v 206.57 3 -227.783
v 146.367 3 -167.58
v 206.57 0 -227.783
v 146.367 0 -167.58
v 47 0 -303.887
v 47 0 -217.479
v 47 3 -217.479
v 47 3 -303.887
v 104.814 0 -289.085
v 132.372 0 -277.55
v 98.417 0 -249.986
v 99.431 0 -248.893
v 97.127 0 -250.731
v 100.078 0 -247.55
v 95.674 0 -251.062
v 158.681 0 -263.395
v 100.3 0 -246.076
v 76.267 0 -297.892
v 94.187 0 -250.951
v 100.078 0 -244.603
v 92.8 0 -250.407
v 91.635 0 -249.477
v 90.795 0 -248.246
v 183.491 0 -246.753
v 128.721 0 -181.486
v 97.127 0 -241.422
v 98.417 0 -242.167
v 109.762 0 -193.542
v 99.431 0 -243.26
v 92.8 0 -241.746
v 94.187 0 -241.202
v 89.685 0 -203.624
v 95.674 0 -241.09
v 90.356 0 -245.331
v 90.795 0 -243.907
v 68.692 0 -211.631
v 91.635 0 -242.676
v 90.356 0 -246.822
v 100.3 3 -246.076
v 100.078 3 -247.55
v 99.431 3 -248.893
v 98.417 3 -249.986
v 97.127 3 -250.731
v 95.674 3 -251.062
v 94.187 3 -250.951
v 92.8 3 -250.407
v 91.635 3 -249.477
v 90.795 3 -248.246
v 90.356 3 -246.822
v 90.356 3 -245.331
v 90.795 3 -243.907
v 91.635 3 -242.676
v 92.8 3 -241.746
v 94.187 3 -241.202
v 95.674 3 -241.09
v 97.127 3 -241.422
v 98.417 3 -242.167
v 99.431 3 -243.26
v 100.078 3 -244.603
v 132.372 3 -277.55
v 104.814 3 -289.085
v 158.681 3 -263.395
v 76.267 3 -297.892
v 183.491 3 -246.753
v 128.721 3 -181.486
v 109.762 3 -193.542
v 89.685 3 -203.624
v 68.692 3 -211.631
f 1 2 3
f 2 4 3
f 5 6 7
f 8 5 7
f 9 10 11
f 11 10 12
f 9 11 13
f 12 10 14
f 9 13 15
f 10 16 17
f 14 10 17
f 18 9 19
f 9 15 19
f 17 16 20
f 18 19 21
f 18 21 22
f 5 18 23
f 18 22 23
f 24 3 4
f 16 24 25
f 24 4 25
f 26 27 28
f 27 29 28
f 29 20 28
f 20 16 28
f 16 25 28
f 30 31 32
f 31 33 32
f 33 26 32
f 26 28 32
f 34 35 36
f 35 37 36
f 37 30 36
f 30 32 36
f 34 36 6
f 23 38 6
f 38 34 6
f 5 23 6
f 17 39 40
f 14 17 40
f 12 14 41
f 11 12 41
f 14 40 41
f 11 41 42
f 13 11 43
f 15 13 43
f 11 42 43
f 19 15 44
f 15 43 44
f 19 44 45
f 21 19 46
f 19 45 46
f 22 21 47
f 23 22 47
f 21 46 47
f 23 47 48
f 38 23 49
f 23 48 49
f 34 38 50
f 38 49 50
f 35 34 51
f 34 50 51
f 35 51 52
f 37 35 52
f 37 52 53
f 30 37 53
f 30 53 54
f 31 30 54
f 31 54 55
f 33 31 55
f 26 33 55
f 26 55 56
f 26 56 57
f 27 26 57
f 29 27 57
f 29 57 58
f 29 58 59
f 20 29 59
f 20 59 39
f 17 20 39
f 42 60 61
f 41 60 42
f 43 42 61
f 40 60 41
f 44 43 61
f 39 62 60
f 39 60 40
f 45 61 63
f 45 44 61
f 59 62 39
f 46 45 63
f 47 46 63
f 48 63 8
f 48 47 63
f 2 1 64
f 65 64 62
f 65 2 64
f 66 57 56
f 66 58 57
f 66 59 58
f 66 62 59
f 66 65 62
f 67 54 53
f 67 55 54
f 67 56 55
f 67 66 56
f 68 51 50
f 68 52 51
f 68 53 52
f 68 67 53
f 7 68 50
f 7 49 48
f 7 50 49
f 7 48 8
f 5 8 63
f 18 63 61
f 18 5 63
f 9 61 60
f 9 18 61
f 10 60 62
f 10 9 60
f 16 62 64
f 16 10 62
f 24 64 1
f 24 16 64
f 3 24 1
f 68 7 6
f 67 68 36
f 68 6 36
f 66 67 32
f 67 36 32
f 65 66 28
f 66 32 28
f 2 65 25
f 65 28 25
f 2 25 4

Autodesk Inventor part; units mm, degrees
ref_plane "YZ Plane" through (0, 0, 0) normal (1, 0, 0) x (0, 1, 0)
ref_plane "XZ Plane" through (0, 0, 0) normal (0, 1, 0) x (-1, 0, 0)
ref_plane "XY Plane" through (0, 0, 0) normal (0, 0, 1) x (1, 0, 0)
sketch "Sketch1" plane through (0, 0, 0) normal (0, 1, 0) x (-1, 0, 0)
  circle A0 centre (0, 0) radius 215
  circle A1 centre (0, 0) radius 315
  line L0 (0, 0) -> (0, -315)
  line L1 (0, 0) -> (-222.7386, -222.7386)
  line L2 (-141.0509, -162.2641) -> (-211.8794, -233.0926)
  line L3 (-15, -214.4761) -> (-15, -314.6427)
  circle A2 centre (0, 0) radius 222.5
  circle A3 centre (0, 0) radius 307.5
  line L4 (-47, -311.4739) -> (-47, -209.7999)
  point P0 (-152.028, -152.028)
  point P1 (0, -215)
  point P2 (0, -312.5)
  point P3 (0, -217.5)
  point P4 (-153.7957, -153.7957)
  point P5 (-220.9709, -220.9709)
  point P6 (-210.1096, -231.3228)
  point P7 (-15, -312.1398)
  point P8 (-15, -216.9821)
  point P9 (-142.8229, -164.0361)
  point P10 (-206.5699, -227.7831)
  point P11 (-15, -307.1339)
  point P12 (-15, -221.9938)
  point P13 (-146.3667, -167.5799)
  point P14 (-47, -303.8869)
  point P15 (-47, -217.4793)
  dimension "d2" = 430
  dimension "d3" = 630
  dimension "d4" = 45
  dimension "d5" = 15
  dimension "d6" = 15
  dimension "d11" = 7.5
  dimension "d12" = 7.5
  dimension "d16" = 32
extrude "Extrusion1" add sketch "Sketch1" along normal blind 3 contours A2 L4 A3 L2 | A2 L3 A3 L4
sketch "Sketch4" plane through (0, 0, 0) normal (0, 0, 1) x (1, 0, 0)
  line L0 (15, 0) -> (146.3667, 0) projected
  line L1 (146.3667, 0) -> (146.3667, 3) projected
  line L2 (15, 3) -> (146.3667, 3) projected
  line L3 (15, 0) -> (15, 3) projected
  line L4 (15, 0) -> (47, 0)
  line L5 (47, 0) -> (47, 3)
  line L6 (47, 3) -> (15, 3)
  line L7 (15, 3) -> (15, 0)
  point P0 (0, 0)
  dimension "d17" = 32
extrude "Extrusion3" cut sketch "Sketch4" against normal up to surface contours L3 L2 L5 L0
sketch "Sketch5" plane through (0, 3, 0) normal (0, 1, 0) x (1, 0, 0)
  line L0 (47, 303.8869) -> (47, 217.4793) projected
  arc A0 (146.3667, 167.5799) -> (47, 217.4793) centre (0, 0) ccw projected
  line L1 (146.3667, 167.5799) -> (206.5699, 227.7831) projected
  arc A1 (206.5699, 227.7831) -> (47, 303.8869) centre (0, 0) ccw projected
  line L2 (146.3667, 167.5799) -> (206.5699, 227.7831) projected
  line L3 (47, 217.4793) -> (47, 303.8869) projected
  circle A2 centre (50, 219.8092) radius 1.75
  circle A3 centre (143.9011, 173.5996) radius 1.75
  circle A4 centre (199.96, 229.6585) radius 1.75
  circle A5 centre (50, 300.4077) radius 1.75
  arc A6 (146.3667, 167.5799) -> (47, 217.4793) centre (0, 0) ccw projected
  line L4 (99.8507, 198.8368) -> (132.3721, 277.5498) construction
  arc A7 (206.5699, 227.7831) -> (47, 303.8869) centre (0, 0) ccw projected
  line L5 (116.1114, 238.1933) -> (47, 266.7477) construction
  line L6 (116.1114, 238.1933) -> (187.4893, 208.7025) construction
  line L7 (50, 300.4077) -> (50, 298.6577) construction
  line L8 (50, 300.4077) -> (47, 300.4077) construction
  line L9 (143.9011, 173.5996) -> (148.1437, 169.3569) construction
  line L10 (50, 219.8092) -> (47, 219.8092) construction
  line L11 (199.96, 229.6585) -> (204.2027, 225.4159) construction
  line L12 (50, 216.8092) -> (50, 303.4077) construction
  line L13 (141.7806, 171.4774) -> (202.1185, 231.742) construction
  dimension "d36" = 3.5
  dimension "d37" = 3
  dimension "d40" = 3.5
  dimension "d45" = 6
  dimension "d47" = 3.5
  dimension "d48" = 3.5
  dimension "d49" = 6
  dimension "d51" = 3
  dimension "d53" = 3
  dimension "d54" = 3
  dimension "d55" = 3
  dimension "d56" = 3
extrude "Extrusion4" [suppressed]
sketch "Sketch6" plane through (0, 3, 0) normal (0, 1, 0) x (1, 0, 0)
  line L0 (47, 303.8869) -> (47, 217.4793) projected
  arc A0 (146.3667, 167.5799) -> (47, 217.4793) centre (0, 0) ccw projected
  line L1 (146.3667, 167.5799) -> (206.5699, 227.7831) projected
  arc A1 (206.5699, 227.7831) -> (47, 303.8869) centre (0, 0) ccw projected
  line L2 (0, 0) -> (132.3721, 277.5498)
  arc A2 (206.5699, 227.7831) -> (47, 303.8869) centre (0, 0) ccw projected
  arc A3 (146.3667, 167.5799) -> (47, 217.4793) centre (0, 0) ccw projected
  line L3 (95.7814, 200.8287) -> (132.3721, 277.5498)
  line L4 (114.0768, 239.1892) -> (95.7814, 200.8287)
  line L5 (146.3667, 167.5799) -> (206.5699, 227.7831) projected
  line L6 (176.4683, 197.6815) -> (47, 260.6831)
  line L7 (47, 217.4793) -> (47, 303.8869) projected
  circle A4 centre (95.3, 246.0764) radius 5
  point P0 (104.9291, 220.009)
  dimension "d61" = 10
  dimension "d62" = 20
  dimension "d63" = 8
extrude "Extrusion5" cut sketch "Sketch6" against normal blind 10 contours A4
properties part number "Battery Module Third Iteration" material "PLA Plastic"
